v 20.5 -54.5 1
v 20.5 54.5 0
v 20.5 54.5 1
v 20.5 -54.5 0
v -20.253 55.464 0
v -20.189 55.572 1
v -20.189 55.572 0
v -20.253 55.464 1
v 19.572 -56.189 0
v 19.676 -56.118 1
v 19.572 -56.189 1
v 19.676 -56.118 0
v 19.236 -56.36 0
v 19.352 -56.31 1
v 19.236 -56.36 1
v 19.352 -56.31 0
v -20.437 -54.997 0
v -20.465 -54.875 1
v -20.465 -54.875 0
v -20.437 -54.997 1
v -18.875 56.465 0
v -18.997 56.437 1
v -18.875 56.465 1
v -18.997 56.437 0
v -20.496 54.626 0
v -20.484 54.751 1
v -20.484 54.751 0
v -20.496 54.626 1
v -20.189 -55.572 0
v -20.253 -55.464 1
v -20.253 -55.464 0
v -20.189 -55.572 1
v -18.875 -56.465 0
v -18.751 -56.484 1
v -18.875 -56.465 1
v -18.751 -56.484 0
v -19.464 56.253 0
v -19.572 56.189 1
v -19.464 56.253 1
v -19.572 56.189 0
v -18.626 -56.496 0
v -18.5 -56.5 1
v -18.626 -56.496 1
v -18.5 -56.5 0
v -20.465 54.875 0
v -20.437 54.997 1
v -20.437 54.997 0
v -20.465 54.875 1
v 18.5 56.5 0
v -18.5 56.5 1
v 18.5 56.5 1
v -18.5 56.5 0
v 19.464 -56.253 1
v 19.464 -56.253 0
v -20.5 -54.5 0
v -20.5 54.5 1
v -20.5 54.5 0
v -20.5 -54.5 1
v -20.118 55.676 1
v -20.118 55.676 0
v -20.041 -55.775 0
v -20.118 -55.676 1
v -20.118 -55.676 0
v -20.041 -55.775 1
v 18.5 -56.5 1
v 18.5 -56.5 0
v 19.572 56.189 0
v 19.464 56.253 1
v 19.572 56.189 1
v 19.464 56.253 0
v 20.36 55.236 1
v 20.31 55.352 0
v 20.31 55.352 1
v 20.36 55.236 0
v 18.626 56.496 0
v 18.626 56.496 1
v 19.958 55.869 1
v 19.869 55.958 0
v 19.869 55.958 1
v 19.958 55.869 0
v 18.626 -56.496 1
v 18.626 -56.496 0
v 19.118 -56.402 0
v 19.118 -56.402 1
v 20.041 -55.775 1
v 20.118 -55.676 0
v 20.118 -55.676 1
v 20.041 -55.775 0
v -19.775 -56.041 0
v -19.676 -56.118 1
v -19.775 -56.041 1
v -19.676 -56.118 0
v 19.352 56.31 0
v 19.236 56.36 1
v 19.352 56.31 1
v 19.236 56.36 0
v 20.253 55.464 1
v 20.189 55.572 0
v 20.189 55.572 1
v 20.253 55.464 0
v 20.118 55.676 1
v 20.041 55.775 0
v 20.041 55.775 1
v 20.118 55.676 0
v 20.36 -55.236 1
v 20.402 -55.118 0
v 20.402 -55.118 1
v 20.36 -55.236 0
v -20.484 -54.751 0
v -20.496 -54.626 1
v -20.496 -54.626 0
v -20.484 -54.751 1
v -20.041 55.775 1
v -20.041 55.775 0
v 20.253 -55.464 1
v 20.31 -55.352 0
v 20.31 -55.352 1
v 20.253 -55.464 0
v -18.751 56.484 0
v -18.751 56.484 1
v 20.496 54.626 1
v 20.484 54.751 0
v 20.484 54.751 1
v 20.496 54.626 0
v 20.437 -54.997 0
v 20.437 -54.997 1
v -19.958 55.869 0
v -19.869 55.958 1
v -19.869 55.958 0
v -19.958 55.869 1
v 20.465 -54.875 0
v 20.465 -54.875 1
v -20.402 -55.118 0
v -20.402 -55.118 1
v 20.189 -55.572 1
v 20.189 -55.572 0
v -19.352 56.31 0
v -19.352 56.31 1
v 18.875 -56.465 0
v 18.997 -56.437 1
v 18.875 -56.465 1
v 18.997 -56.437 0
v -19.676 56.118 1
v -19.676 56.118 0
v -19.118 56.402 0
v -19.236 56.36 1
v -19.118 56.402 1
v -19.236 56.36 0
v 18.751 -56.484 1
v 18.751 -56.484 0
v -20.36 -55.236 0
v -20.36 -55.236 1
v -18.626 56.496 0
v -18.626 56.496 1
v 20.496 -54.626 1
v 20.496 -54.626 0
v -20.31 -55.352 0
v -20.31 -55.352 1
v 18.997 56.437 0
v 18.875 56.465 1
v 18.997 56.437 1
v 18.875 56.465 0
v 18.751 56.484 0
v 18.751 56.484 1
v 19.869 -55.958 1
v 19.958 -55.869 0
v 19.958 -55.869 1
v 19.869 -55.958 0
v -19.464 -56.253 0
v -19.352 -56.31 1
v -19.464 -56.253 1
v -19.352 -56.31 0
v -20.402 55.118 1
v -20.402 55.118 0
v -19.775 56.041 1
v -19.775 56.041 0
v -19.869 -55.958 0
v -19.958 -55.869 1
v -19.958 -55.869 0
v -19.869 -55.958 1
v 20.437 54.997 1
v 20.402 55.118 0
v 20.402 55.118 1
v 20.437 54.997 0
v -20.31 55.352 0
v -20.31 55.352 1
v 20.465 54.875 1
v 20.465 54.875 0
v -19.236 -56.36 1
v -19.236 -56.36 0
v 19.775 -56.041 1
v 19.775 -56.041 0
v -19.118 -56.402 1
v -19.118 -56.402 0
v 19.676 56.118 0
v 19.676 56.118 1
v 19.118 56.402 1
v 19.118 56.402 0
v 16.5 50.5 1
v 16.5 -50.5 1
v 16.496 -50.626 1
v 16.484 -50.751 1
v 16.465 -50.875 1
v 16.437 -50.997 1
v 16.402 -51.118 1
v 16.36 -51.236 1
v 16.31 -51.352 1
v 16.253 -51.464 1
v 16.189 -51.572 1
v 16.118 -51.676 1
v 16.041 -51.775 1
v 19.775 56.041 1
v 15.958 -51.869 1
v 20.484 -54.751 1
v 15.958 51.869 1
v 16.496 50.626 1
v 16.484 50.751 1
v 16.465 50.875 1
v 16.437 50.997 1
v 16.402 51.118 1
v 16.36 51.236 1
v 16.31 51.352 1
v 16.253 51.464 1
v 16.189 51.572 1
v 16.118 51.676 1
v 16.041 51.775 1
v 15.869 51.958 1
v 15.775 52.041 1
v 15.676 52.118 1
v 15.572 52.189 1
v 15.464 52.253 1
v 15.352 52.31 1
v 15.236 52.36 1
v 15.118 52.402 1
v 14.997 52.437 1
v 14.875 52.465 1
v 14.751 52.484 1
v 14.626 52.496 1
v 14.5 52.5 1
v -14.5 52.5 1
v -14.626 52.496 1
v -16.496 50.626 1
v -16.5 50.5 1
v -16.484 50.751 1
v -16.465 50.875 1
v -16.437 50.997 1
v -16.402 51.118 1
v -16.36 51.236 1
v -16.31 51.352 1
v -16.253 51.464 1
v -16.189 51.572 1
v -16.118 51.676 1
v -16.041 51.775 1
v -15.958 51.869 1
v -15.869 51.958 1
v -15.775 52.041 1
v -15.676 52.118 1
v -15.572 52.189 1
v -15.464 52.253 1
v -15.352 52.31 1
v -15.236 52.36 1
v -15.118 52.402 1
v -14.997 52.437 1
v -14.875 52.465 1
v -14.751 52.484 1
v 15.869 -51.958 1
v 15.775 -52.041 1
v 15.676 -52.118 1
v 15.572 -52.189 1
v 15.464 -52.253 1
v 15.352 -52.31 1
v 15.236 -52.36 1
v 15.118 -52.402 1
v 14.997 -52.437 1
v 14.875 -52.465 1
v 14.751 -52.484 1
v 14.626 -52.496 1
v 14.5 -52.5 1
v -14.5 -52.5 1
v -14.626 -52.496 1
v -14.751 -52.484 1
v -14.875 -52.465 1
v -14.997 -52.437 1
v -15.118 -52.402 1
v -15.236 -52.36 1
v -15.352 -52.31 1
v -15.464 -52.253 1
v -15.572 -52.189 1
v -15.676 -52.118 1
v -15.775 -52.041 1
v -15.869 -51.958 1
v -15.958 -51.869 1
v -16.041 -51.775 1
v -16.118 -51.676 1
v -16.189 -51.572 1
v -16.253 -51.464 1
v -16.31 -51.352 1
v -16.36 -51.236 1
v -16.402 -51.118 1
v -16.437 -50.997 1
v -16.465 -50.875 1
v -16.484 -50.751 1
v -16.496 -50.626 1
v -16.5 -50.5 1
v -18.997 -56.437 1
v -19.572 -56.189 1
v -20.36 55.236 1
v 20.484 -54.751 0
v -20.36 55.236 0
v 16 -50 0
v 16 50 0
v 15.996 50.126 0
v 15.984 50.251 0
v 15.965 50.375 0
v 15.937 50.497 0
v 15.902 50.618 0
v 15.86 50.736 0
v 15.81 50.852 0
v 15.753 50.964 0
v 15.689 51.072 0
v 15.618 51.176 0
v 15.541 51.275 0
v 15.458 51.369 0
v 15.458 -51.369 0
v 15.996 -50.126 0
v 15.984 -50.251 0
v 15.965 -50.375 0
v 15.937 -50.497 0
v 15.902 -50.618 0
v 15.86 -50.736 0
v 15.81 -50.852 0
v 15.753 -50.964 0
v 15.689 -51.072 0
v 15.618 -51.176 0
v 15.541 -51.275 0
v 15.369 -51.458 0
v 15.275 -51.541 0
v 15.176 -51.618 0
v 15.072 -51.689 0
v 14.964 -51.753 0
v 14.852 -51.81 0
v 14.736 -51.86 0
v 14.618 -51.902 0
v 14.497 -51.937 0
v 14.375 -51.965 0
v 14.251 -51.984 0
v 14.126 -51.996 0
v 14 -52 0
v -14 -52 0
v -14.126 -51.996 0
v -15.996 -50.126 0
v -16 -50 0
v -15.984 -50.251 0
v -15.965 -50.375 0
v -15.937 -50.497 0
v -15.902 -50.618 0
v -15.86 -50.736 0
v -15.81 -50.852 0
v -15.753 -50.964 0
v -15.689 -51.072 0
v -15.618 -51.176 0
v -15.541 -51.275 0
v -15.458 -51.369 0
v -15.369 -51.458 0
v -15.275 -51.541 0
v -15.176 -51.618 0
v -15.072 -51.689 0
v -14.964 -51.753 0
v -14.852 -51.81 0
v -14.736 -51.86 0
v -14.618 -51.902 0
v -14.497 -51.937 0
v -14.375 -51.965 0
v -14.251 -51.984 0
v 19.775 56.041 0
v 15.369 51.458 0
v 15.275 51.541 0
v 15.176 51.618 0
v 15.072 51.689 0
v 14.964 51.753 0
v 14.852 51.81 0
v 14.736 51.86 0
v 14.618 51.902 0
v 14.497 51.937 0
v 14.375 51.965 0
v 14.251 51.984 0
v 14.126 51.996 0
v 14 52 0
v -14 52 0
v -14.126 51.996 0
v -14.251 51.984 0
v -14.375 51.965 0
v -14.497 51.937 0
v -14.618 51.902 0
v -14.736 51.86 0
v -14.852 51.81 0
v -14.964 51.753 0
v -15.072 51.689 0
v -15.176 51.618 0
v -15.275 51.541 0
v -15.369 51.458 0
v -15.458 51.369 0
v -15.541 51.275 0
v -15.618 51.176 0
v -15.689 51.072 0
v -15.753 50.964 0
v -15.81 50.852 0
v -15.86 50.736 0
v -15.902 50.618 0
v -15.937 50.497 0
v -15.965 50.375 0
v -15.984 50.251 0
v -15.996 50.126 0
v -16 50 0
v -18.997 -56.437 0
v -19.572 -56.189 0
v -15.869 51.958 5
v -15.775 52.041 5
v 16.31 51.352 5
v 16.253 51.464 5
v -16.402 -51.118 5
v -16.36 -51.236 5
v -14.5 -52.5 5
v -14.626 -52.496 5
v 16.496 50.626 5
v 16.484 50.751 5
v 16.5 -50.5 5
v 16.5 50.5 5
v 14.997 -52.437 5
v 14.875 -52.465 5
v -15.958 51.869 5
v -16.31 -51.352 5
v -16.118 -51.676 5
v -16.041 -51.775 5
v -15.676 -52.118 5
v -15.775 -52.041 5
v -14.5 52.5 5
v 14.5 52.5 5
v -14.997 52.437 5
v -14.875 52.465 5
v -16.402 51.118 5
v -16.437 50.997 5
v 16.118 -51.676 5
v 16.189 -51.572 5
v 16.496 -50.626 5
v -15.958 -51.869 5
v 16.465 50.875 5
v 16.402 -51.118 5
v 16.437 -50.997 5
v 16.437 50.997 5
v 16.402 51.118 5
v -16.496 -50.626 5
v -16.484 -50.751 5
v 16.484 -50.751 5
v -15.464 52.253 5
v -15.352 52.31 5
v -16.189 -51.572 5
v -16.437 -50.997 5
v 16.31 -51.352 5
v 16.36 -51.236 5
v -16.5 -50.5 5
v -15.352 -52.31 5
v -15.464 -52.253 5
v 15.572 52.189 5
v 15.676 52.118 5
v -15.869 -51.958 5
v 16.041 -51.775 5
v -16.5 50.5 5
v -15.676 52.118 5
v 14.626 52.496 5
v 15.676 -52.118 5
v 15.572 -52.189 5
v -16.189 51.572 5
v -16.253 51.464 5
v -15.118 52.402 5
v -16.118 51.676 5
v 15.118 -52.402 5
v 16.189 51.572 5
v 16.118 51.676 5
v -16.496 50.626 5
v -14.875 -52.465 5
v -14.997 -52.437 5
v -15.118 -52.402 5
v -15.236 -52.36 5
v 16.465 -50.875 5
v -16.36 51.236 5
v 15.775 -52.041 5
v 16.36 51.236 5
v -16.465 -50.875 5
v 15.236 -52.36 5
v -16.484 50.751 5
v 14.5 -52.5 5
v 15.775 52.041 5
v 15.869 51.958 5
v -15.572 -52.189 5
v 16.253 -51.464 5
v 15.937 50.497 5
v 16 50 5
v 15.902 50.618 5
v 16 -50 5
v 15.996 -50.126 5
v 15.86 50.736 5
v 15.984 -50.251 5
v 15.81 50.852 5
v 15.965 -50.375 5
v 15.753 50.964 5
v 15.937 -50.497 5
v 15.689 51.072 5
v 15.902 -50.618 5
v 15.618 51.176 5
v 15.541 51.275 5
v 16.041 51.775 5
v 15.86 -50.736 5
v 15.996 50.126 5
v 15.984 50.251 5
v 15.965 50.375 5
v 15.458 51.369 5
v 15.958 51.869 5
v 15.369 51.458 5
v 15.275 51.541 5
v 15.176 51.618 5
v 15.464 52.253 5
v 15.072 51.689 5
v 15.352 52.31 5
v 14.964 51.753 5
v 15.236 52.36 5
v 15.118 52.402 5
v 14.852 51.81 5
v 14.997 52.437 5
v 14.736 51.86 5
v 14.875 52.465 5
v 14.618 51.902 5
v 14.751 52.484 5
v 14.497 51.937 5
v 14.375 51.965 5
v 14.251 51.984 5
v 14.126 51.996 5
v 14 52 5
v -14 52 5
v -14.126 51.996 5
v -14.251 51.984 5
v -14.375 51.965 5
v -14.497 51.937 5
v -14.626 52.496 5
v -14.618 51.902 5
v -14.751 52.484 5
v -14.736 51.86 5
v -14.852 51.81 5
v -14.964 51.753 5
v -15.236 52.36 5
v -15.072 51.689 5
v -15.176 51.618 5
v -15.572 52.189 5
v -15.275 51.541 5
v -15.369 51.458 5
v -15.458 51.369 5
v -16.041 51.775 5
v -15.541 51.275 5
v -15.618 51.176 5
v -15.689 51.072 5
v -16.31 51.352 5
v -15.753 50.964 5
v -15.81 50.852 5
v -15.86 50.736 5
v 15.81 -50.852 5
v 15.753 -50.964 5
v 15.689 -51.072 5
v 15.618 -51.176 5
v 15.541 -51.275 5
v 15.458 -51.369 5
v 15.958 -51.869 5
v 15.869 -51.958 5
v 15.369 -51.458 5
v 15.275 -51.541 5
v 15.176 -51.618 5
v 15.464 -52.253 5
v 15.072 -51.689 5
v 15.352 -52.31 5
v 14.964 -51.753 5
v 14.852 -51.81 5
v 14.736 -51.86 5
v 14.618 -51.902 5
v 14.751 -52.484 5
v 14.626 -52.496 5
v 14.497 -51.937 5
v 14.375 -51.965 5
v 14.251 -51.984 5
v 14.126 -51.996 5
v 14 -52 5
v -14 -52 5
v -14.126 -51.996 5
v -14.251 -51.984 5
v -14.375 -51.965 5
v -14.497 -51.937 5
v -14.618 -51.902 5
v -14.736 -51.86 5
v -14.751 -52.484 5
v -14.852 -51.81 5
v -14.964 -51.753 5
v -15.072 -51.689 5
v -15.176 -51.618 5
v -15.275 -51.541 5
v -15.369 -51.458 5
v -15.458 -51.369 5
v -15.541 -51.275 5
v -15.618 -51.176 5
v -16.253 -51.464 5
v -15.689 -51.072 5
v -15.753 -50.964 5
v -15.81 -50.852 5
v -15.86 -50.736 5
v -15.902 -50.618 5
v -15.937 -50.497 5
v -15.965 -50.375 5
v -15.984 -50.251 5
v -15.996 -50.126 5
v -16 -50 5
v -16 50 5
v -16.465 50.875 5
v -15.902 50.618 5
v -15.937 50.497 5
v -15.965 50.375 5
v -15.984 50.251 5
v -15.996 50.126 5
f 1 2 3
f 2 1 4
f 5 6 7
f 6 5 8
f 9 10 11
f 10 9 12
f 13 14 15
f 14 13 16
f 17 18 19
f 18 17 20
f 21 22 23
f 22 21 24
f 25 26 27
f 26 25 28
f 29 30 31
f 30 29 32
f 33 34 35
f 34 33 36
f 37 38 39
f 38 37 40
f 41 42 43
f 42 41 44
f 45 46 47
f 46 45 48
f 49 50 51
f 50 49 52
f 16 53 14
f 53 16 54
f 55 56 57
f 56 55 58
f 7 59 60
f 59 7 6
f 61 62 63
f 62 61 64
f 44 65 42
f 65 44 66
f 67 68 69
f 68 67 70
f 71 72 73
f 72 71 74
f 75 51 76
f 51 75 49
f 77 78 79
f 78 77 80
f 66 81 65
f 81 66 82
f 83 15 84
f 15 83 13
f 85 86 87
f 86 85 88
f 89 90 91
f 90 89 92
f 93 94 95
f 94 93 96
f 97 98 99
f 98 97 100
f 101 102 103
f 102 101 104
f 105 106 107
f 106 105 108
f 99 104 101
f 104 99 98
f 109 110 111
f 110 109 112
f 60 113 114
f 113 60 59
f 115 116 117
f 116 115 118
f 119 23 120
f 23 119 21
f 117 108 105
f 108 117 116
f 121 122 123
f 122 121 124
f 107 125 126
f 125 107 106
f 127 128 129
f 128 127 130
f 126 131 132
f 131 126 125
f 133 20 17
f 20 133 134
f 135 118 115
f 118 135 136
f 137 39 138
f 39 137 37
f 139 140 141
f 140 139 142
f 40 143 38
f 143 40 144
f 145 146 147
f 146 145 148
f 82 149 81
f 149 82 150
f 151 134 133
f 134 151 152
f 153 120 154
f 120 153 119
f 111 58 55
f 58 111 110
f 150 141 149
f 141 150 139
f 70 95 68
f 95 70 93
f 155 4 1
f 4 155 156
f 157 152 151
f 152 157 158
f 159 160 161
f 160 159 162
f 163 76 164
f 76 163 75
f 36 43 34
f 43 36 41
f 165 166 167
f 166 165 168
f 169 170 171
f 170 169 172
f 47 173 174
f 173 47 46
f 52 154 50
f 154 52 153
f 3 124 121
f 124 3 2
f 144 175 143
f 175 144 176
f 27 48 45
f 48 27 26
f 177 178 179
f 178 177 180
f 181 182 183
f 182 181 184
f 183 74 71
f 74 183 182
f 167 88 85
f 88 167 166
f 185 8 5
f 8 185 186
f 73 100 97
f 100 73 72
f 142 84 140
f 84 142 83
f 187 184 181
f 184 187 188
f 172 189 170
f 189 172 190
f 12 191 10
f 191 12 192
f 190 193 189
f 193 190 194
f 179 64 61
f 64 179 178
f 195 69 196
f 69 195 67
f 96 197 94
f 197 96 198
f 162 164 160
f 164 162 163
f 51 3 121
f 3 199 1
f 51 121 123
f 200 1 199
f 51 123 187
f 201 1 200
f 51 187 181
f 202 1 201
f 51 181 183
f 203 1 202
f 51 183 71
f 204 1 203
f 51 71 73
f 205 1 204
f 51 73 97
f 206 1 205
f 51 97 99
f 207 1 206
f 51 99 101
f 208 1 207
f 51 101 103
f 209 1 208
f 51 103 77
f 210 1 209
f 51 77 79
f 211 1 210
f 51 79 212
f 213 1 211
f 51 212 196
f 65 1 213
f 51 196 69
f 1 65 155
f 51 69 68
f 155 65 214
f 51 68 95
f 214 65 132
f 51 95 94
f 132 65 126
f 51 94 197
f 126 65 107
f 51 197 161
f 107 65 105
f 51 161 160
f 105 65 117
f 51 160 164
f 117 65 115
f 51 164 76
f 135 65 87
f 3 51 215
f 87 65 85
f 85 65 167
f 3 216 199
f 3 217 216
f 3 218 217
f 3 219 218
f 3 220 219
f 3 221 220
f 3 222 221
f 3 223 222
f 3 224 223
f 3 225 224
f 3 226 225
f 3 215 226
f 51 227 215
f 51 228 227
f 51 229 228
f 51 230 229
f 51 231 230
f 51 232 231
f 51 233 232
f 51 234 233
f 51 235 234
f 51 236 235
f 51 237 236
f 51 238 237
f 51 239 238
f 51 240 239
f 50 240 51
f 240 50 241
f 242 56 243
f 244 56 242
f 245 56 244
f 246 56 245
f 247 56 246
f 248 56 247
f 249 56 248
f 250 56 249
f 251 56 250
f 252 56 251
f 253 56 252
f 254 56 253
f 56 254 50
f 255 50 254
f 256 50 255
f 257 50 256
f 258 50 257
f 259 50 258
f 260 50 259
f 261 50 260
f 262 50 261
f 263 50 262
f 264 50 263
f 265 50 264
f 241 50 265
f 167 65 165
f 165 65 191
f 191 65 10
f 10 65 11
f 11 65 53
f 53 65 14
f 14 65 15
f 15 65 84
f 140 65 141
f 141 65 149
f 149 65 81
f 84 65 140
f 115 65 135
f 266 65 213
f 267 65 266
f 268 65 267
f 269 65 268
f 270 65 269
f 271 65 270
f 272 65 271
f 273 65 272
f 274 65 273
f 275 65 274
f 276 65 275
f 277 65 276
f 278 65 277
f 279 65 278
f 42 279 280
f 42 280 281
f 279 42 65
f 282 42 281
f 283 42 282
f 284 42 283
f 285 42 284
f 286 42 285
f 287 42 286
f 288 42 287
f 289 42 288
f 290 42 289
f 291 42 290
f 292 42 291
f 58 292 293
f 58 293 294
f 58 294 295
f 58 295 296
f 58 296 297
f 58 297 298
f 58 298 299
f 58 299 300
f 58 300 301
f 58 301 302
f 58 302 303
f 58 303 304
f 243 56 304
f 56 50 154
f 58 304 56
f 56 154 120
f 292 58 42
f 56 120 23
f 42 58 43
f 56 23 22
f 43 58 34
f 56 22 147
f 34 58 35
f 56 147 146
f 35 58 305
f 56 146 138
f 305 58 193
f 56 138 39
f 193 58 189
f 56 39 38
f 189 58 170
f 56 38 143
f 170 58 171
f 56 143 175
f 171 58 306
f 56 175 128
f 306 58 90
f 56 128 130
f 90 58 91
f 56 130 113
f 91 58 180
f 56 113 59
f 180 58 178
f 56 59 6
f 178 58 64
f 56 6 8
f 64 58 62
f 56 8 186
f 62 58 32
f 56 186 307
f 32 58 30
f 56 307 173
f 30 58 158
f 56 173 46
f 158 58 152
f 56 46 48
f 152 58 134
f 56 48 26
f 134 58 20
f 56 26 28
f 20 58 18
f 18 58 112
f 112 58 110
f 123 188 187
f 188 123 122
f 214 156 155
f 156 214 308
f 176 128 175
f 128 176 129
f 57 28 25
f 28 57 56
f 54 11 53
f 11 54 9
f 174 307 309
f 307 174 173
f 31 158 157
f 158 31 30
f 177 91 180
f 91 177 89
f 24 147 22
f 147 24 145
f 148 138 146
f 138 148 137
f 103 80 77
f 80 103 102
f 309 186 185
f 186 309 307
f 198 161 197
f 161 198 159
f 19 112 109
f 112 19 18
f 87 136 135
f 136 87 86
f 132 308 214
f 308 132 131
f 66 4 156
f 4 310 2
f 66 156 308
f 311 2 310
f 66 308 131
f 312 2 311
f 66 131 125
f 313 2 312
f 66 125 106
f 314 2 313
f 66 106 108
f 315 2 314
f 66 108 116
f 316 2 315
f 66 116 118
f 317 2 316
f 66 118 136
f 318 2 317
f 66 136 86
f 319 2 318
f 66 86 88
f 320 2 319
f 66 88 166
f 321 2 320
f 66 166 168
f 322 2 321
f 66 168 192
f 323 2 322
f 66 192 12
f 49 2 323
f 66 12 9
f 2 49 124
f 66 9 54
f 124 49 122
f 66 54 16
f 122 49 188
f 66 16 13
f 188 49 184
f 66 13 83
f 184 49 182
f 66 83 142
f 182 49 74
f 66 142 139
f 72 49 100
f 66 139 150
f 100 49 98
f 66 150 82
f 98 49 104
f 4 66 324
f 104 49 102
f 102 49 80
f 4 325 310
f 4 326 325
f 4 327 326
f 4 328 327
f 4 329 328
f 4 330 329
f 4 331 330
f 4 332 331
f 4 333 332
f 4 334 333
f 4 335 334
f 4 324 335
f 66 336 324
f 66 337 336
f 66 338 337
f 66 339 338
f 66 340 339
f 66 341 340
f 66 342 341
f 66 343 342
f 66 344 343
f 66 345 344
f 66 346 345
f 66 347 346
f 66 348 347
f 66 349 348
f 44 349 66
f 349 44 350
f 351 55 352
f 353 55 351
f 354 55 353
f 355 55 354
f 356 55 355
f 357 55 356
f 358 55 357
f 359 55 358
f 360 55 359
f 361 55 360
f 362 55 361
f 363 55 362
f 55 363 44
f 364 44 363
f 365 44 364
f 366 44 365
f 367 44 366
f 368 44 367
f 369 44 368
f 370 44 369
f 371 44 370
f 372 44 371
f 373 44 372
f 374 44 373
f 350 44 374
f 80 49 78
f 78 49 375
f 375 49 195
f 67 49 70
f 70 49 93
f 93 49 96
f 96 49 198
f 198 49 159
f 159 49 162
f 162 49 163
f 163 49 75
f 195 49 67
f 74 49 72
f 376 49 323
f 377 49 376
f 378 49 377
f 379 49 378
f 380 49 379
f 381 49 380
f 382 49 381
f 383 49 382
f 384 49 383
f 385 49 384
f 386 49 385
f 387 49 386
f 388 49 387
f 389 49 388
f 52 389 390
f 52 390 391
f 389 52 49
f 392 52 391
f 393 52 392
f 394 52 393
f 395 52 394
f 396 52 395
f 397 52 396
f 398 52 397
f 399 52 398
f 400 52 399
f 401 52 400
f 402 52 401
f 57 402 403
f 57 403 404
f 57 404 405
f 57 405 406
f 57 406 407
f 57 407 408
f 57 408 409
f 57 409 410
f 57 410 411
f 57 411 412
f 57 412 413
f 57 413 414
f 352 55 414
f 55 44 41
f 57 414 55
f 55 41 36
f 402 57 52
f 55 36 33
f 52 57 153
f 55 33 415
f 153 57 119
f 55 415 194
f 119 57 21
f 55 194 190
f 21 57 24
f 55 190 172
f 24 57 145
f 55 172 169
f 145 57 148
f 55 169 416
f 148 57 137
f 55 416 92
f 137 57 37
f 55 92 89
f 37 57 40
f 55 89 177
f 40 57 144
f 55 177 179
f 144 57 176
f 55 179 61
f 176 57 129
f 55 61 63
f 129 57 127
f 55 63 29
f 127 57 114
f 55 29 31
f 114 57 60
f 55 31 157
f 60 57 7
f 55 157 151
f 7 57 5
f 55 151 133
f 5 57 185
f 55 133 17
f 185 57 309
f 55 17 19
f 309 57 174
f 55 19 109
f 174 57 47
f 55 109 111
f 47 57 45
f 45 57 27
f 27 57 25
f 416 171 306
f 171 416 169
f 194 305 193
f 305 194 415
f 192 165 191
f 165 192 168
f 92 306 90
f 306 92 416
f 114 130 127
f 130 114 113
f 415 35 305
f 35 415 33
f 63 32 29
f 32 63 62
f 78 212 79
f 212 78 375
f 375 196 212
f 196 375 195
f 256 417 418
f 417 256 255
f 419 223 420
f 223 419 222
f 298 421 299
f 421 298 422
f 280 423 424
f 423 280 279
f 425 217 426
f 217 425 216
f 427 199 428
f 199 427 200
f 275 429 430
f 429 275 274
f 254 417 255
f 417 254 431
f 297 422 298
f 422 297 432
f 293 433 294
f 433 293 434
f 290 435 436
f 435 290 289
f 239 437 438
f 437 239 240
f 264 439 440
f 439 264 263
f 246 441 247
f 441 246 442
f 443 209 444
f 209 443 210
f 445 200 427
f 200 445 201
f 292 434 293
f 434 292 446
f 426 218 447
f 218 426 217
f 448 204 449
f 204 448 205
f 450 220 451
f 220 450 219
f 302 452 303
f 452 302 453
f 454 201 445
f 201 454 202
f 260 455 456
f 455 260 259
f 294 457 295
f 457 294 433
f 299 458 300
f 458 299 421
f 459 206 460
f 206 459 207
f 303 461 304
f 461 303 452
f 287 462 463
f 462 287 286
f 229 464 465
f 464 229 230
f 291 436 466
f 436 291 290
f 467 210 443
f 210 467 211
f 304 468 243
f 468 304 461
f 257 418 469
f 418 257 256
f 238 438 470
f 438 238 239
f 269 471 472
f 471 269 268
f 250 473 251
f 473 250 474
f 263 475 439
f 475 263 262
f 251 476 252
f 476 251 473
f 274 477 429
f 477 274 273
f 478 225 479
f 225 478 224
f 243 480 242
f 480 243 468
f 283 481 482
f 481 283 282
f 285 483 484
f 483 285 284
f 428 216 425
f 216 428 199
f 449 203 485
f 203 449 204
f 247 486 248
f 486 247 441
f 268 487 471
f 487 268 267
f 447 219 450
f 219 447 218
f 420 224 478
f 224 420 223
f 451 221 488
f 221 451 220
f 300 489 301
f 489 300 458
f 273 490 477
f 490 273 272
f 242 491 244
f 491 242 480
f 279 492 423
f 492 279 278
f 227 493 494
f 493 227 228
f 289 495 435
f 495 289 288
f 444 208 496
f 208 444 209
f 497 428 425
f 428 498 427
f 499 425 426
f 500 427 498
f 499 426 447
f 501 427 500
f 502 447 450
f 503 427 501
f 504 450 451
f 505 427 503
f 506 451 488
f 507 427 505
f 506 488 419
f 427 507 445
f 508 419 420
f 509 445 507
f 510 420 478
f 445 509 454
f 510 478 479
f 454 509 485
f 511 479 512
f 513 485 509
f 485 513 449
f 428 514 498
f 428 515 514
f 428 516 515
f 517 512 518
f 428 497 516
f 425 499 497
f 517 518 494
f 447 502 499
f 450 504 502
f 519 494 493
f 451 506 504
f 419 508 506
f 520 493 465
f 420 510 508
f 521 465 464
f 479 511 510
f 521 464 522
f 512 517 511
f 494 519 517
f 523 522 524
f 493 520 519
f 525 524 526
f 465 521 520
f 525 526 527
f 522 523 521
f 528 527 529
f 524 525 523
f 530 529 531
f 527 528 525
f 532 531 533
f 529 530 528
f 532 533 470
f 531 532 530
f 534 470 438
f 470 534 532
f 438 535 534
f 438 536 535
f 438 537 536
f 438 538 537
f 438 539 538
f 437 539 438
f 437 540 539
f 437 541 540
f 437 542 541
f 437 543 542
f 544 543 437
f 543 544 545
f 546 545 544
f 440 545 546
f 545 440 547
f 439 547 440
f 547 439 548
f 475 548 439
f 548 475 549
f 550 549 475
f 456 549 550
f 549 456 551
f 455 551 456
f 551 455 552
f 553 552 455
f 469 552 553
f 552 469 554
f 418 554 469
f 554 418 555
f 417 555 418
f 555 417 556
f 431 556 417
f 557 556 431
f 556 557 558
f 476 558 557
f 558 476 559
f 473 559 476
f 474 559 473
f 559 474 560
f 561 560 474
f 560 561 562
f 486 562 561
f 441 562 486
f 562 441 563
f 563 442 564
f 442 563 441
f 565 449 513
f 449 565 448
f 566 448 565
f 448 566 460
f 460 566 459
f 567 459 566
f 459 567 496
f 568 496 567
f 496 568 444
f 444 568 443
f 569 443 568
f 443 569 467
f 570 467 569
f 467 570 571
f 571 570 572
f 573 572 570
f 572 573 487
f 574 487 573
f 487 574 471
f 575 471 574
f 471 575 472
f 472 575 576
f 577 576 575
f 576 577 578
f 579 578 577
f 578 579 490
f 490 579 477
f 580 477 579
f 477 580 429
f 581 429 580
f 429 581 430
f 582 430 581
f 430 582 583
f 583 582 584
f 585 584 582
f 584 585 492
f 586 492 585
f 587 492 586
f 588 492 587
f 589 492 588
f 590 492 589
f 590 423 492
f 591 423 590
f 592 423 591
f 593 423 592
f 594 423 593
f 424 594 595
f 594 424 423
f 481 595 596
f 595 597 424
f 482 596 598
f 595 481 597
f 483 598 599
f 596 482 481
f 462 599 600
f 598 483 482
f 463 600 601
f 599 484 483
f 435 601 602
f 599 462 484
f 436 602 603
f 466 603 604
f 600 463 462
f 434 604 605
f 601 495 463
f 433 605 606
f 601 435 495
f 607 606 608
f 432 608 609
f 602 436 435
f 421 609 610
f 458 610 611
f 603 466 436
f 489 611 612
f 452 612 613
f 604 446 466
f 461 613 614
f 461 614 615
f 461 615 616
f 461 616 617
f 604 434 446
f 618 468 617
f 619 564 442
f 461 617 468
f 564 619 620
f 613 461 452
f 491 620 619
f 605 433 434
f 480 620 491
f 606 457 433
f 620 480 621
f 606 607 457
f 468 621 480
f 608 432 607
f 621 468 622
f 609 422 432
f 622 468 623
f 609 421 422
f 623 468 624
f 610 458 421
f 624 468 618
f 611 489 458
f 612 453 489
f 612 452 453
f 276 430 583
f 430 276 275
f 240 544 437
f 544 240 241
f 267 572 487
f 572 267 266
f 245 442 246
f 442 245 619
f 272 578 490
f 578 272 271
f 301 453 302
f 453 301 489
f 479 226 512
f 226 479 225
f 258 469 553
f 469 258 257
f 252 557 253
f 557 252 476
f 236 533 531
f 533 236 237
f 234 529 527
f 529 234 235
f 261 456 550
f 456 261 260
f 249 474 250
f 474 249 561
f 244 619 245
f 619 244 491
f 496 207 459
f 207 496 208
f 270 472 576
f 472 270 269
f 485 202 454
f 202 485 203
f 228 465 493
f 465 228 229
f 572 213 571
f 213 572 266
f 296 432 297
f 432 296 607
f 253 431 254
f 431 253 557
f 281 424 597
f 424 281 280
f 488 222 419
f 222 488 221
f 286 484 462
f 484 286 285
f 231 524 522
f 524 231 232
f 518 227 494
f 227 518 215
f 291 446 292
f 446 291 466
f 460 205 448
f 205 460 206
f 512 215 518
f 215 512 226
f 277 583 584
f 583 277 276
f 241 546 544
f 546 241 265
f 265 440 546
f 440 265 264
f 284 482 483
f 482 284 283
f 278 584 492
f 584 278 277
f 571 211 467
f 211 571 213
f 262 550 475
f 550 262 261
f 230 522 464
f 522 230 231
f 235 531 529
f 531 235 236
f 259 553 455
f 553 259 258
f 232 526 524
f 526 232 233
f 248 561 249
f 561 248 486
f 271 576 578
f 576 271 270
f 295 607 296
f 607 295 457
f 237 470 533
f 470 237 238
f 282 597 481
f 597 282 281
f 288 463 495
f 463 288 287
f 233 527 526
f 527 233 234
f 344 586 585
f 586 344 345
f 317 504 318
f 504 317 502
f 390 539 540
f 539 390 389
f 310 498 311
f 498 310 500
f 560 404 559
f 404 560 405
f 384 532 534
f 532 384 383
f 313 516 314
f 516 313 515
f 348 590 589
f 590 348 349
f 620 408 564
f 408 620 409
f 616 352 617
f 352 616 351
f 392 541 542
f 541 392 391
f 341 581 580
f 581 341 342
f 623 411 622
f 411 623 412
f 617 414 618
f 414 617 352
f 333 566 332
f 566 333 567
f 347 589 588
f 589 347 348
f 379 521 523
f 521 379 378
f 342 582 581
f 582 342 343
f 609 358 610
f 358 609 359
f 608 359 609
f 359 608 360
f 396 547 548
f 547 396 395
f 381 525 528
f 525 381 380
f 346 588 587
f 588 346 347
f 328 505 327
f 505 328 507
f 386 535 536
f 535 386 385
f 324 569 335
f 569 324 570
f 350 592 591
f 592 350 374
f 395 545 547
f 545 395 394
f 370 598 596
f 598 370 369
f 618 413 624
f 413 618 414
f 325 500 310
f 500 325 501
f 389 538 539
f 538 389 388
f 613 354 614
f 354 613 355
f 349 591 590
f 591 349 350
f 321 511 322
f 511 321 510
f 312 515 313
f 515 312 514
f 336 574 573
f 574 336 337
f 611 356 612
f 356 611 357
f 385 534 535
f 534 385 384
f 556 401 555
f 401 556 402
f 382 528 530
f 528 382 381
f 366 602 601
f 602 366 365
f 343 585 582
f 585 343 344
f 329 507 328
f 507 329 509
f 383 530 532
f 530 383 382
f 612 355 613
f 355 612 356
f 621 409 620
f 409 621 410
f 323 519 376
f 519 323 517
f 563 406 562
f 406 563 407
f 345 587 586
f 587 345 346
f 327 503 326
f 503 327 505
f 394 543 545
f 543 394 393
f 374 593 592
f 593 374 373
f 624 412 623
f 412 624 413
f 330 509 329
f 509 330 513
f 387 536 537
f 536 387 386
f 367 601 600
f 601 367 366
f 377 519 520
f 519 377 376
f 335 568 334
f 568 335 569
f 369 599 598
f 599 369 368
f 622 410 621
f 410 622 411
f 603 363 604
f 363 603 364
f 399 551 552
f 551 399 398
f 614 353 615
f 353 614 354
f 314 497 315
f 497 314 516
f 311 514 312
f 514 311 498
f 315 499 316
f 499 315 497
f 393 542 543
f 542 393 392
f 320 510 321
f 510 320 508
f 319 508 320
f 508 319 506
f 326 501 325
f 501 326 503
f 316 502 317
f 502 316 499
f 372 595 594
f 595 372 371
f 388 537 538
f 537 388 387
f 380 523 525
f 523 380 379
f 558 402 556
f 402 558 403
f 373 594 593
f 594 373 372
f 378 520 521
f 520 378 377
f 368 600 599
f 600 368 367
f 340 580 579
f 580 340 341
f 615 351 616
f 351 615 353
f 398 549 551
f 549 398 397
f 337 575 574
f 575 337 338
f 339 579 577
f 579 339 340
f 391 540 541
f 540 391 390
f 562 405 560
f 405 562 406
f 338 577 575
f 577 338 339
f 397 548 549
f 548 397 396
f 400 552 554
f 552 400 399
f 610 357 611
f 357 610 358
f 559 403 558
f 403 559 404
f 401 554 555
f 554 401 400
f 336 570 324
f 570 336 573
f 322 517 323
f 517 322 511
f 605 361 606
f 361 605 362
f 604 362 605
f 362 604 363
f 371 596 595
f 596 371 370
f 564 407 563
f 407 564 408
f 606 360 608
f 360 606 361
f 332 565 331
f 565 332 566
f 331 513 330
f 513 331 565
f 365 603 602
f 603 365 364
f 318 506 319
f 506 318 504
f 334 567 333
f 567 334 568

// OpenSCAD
width = 33;
length = 105;
thickness = 4;
corner_dia = 4;

inner_width = width - 1;
inner_length = length - 1;

lip_width = 4;
lip_thickness = 1;

$fn = 100;

module rounded_rect(width, length, height, corner_dia) {
  hull() {
    for (i = [-1, 1]) {
      for (j = [-1, 1]) {
        translate([i * (width - corner_dia)/2, j * (length - corner_dia)/2, 0])
        cylinder(d = corner_dia, h = height);
      }
    }
  }
}

difference() {
  union() {
    rounded_rect(width + 2 * lip_width, length + 2 * lip_width, lip_thickness, corner_dia);
    rounded_rect(width, length, lip_thickness + thickness, corner_dia);
  }

  rounded_rect(inner_width, inner_length, lip_thickness + thickness, corner_dia);
}
